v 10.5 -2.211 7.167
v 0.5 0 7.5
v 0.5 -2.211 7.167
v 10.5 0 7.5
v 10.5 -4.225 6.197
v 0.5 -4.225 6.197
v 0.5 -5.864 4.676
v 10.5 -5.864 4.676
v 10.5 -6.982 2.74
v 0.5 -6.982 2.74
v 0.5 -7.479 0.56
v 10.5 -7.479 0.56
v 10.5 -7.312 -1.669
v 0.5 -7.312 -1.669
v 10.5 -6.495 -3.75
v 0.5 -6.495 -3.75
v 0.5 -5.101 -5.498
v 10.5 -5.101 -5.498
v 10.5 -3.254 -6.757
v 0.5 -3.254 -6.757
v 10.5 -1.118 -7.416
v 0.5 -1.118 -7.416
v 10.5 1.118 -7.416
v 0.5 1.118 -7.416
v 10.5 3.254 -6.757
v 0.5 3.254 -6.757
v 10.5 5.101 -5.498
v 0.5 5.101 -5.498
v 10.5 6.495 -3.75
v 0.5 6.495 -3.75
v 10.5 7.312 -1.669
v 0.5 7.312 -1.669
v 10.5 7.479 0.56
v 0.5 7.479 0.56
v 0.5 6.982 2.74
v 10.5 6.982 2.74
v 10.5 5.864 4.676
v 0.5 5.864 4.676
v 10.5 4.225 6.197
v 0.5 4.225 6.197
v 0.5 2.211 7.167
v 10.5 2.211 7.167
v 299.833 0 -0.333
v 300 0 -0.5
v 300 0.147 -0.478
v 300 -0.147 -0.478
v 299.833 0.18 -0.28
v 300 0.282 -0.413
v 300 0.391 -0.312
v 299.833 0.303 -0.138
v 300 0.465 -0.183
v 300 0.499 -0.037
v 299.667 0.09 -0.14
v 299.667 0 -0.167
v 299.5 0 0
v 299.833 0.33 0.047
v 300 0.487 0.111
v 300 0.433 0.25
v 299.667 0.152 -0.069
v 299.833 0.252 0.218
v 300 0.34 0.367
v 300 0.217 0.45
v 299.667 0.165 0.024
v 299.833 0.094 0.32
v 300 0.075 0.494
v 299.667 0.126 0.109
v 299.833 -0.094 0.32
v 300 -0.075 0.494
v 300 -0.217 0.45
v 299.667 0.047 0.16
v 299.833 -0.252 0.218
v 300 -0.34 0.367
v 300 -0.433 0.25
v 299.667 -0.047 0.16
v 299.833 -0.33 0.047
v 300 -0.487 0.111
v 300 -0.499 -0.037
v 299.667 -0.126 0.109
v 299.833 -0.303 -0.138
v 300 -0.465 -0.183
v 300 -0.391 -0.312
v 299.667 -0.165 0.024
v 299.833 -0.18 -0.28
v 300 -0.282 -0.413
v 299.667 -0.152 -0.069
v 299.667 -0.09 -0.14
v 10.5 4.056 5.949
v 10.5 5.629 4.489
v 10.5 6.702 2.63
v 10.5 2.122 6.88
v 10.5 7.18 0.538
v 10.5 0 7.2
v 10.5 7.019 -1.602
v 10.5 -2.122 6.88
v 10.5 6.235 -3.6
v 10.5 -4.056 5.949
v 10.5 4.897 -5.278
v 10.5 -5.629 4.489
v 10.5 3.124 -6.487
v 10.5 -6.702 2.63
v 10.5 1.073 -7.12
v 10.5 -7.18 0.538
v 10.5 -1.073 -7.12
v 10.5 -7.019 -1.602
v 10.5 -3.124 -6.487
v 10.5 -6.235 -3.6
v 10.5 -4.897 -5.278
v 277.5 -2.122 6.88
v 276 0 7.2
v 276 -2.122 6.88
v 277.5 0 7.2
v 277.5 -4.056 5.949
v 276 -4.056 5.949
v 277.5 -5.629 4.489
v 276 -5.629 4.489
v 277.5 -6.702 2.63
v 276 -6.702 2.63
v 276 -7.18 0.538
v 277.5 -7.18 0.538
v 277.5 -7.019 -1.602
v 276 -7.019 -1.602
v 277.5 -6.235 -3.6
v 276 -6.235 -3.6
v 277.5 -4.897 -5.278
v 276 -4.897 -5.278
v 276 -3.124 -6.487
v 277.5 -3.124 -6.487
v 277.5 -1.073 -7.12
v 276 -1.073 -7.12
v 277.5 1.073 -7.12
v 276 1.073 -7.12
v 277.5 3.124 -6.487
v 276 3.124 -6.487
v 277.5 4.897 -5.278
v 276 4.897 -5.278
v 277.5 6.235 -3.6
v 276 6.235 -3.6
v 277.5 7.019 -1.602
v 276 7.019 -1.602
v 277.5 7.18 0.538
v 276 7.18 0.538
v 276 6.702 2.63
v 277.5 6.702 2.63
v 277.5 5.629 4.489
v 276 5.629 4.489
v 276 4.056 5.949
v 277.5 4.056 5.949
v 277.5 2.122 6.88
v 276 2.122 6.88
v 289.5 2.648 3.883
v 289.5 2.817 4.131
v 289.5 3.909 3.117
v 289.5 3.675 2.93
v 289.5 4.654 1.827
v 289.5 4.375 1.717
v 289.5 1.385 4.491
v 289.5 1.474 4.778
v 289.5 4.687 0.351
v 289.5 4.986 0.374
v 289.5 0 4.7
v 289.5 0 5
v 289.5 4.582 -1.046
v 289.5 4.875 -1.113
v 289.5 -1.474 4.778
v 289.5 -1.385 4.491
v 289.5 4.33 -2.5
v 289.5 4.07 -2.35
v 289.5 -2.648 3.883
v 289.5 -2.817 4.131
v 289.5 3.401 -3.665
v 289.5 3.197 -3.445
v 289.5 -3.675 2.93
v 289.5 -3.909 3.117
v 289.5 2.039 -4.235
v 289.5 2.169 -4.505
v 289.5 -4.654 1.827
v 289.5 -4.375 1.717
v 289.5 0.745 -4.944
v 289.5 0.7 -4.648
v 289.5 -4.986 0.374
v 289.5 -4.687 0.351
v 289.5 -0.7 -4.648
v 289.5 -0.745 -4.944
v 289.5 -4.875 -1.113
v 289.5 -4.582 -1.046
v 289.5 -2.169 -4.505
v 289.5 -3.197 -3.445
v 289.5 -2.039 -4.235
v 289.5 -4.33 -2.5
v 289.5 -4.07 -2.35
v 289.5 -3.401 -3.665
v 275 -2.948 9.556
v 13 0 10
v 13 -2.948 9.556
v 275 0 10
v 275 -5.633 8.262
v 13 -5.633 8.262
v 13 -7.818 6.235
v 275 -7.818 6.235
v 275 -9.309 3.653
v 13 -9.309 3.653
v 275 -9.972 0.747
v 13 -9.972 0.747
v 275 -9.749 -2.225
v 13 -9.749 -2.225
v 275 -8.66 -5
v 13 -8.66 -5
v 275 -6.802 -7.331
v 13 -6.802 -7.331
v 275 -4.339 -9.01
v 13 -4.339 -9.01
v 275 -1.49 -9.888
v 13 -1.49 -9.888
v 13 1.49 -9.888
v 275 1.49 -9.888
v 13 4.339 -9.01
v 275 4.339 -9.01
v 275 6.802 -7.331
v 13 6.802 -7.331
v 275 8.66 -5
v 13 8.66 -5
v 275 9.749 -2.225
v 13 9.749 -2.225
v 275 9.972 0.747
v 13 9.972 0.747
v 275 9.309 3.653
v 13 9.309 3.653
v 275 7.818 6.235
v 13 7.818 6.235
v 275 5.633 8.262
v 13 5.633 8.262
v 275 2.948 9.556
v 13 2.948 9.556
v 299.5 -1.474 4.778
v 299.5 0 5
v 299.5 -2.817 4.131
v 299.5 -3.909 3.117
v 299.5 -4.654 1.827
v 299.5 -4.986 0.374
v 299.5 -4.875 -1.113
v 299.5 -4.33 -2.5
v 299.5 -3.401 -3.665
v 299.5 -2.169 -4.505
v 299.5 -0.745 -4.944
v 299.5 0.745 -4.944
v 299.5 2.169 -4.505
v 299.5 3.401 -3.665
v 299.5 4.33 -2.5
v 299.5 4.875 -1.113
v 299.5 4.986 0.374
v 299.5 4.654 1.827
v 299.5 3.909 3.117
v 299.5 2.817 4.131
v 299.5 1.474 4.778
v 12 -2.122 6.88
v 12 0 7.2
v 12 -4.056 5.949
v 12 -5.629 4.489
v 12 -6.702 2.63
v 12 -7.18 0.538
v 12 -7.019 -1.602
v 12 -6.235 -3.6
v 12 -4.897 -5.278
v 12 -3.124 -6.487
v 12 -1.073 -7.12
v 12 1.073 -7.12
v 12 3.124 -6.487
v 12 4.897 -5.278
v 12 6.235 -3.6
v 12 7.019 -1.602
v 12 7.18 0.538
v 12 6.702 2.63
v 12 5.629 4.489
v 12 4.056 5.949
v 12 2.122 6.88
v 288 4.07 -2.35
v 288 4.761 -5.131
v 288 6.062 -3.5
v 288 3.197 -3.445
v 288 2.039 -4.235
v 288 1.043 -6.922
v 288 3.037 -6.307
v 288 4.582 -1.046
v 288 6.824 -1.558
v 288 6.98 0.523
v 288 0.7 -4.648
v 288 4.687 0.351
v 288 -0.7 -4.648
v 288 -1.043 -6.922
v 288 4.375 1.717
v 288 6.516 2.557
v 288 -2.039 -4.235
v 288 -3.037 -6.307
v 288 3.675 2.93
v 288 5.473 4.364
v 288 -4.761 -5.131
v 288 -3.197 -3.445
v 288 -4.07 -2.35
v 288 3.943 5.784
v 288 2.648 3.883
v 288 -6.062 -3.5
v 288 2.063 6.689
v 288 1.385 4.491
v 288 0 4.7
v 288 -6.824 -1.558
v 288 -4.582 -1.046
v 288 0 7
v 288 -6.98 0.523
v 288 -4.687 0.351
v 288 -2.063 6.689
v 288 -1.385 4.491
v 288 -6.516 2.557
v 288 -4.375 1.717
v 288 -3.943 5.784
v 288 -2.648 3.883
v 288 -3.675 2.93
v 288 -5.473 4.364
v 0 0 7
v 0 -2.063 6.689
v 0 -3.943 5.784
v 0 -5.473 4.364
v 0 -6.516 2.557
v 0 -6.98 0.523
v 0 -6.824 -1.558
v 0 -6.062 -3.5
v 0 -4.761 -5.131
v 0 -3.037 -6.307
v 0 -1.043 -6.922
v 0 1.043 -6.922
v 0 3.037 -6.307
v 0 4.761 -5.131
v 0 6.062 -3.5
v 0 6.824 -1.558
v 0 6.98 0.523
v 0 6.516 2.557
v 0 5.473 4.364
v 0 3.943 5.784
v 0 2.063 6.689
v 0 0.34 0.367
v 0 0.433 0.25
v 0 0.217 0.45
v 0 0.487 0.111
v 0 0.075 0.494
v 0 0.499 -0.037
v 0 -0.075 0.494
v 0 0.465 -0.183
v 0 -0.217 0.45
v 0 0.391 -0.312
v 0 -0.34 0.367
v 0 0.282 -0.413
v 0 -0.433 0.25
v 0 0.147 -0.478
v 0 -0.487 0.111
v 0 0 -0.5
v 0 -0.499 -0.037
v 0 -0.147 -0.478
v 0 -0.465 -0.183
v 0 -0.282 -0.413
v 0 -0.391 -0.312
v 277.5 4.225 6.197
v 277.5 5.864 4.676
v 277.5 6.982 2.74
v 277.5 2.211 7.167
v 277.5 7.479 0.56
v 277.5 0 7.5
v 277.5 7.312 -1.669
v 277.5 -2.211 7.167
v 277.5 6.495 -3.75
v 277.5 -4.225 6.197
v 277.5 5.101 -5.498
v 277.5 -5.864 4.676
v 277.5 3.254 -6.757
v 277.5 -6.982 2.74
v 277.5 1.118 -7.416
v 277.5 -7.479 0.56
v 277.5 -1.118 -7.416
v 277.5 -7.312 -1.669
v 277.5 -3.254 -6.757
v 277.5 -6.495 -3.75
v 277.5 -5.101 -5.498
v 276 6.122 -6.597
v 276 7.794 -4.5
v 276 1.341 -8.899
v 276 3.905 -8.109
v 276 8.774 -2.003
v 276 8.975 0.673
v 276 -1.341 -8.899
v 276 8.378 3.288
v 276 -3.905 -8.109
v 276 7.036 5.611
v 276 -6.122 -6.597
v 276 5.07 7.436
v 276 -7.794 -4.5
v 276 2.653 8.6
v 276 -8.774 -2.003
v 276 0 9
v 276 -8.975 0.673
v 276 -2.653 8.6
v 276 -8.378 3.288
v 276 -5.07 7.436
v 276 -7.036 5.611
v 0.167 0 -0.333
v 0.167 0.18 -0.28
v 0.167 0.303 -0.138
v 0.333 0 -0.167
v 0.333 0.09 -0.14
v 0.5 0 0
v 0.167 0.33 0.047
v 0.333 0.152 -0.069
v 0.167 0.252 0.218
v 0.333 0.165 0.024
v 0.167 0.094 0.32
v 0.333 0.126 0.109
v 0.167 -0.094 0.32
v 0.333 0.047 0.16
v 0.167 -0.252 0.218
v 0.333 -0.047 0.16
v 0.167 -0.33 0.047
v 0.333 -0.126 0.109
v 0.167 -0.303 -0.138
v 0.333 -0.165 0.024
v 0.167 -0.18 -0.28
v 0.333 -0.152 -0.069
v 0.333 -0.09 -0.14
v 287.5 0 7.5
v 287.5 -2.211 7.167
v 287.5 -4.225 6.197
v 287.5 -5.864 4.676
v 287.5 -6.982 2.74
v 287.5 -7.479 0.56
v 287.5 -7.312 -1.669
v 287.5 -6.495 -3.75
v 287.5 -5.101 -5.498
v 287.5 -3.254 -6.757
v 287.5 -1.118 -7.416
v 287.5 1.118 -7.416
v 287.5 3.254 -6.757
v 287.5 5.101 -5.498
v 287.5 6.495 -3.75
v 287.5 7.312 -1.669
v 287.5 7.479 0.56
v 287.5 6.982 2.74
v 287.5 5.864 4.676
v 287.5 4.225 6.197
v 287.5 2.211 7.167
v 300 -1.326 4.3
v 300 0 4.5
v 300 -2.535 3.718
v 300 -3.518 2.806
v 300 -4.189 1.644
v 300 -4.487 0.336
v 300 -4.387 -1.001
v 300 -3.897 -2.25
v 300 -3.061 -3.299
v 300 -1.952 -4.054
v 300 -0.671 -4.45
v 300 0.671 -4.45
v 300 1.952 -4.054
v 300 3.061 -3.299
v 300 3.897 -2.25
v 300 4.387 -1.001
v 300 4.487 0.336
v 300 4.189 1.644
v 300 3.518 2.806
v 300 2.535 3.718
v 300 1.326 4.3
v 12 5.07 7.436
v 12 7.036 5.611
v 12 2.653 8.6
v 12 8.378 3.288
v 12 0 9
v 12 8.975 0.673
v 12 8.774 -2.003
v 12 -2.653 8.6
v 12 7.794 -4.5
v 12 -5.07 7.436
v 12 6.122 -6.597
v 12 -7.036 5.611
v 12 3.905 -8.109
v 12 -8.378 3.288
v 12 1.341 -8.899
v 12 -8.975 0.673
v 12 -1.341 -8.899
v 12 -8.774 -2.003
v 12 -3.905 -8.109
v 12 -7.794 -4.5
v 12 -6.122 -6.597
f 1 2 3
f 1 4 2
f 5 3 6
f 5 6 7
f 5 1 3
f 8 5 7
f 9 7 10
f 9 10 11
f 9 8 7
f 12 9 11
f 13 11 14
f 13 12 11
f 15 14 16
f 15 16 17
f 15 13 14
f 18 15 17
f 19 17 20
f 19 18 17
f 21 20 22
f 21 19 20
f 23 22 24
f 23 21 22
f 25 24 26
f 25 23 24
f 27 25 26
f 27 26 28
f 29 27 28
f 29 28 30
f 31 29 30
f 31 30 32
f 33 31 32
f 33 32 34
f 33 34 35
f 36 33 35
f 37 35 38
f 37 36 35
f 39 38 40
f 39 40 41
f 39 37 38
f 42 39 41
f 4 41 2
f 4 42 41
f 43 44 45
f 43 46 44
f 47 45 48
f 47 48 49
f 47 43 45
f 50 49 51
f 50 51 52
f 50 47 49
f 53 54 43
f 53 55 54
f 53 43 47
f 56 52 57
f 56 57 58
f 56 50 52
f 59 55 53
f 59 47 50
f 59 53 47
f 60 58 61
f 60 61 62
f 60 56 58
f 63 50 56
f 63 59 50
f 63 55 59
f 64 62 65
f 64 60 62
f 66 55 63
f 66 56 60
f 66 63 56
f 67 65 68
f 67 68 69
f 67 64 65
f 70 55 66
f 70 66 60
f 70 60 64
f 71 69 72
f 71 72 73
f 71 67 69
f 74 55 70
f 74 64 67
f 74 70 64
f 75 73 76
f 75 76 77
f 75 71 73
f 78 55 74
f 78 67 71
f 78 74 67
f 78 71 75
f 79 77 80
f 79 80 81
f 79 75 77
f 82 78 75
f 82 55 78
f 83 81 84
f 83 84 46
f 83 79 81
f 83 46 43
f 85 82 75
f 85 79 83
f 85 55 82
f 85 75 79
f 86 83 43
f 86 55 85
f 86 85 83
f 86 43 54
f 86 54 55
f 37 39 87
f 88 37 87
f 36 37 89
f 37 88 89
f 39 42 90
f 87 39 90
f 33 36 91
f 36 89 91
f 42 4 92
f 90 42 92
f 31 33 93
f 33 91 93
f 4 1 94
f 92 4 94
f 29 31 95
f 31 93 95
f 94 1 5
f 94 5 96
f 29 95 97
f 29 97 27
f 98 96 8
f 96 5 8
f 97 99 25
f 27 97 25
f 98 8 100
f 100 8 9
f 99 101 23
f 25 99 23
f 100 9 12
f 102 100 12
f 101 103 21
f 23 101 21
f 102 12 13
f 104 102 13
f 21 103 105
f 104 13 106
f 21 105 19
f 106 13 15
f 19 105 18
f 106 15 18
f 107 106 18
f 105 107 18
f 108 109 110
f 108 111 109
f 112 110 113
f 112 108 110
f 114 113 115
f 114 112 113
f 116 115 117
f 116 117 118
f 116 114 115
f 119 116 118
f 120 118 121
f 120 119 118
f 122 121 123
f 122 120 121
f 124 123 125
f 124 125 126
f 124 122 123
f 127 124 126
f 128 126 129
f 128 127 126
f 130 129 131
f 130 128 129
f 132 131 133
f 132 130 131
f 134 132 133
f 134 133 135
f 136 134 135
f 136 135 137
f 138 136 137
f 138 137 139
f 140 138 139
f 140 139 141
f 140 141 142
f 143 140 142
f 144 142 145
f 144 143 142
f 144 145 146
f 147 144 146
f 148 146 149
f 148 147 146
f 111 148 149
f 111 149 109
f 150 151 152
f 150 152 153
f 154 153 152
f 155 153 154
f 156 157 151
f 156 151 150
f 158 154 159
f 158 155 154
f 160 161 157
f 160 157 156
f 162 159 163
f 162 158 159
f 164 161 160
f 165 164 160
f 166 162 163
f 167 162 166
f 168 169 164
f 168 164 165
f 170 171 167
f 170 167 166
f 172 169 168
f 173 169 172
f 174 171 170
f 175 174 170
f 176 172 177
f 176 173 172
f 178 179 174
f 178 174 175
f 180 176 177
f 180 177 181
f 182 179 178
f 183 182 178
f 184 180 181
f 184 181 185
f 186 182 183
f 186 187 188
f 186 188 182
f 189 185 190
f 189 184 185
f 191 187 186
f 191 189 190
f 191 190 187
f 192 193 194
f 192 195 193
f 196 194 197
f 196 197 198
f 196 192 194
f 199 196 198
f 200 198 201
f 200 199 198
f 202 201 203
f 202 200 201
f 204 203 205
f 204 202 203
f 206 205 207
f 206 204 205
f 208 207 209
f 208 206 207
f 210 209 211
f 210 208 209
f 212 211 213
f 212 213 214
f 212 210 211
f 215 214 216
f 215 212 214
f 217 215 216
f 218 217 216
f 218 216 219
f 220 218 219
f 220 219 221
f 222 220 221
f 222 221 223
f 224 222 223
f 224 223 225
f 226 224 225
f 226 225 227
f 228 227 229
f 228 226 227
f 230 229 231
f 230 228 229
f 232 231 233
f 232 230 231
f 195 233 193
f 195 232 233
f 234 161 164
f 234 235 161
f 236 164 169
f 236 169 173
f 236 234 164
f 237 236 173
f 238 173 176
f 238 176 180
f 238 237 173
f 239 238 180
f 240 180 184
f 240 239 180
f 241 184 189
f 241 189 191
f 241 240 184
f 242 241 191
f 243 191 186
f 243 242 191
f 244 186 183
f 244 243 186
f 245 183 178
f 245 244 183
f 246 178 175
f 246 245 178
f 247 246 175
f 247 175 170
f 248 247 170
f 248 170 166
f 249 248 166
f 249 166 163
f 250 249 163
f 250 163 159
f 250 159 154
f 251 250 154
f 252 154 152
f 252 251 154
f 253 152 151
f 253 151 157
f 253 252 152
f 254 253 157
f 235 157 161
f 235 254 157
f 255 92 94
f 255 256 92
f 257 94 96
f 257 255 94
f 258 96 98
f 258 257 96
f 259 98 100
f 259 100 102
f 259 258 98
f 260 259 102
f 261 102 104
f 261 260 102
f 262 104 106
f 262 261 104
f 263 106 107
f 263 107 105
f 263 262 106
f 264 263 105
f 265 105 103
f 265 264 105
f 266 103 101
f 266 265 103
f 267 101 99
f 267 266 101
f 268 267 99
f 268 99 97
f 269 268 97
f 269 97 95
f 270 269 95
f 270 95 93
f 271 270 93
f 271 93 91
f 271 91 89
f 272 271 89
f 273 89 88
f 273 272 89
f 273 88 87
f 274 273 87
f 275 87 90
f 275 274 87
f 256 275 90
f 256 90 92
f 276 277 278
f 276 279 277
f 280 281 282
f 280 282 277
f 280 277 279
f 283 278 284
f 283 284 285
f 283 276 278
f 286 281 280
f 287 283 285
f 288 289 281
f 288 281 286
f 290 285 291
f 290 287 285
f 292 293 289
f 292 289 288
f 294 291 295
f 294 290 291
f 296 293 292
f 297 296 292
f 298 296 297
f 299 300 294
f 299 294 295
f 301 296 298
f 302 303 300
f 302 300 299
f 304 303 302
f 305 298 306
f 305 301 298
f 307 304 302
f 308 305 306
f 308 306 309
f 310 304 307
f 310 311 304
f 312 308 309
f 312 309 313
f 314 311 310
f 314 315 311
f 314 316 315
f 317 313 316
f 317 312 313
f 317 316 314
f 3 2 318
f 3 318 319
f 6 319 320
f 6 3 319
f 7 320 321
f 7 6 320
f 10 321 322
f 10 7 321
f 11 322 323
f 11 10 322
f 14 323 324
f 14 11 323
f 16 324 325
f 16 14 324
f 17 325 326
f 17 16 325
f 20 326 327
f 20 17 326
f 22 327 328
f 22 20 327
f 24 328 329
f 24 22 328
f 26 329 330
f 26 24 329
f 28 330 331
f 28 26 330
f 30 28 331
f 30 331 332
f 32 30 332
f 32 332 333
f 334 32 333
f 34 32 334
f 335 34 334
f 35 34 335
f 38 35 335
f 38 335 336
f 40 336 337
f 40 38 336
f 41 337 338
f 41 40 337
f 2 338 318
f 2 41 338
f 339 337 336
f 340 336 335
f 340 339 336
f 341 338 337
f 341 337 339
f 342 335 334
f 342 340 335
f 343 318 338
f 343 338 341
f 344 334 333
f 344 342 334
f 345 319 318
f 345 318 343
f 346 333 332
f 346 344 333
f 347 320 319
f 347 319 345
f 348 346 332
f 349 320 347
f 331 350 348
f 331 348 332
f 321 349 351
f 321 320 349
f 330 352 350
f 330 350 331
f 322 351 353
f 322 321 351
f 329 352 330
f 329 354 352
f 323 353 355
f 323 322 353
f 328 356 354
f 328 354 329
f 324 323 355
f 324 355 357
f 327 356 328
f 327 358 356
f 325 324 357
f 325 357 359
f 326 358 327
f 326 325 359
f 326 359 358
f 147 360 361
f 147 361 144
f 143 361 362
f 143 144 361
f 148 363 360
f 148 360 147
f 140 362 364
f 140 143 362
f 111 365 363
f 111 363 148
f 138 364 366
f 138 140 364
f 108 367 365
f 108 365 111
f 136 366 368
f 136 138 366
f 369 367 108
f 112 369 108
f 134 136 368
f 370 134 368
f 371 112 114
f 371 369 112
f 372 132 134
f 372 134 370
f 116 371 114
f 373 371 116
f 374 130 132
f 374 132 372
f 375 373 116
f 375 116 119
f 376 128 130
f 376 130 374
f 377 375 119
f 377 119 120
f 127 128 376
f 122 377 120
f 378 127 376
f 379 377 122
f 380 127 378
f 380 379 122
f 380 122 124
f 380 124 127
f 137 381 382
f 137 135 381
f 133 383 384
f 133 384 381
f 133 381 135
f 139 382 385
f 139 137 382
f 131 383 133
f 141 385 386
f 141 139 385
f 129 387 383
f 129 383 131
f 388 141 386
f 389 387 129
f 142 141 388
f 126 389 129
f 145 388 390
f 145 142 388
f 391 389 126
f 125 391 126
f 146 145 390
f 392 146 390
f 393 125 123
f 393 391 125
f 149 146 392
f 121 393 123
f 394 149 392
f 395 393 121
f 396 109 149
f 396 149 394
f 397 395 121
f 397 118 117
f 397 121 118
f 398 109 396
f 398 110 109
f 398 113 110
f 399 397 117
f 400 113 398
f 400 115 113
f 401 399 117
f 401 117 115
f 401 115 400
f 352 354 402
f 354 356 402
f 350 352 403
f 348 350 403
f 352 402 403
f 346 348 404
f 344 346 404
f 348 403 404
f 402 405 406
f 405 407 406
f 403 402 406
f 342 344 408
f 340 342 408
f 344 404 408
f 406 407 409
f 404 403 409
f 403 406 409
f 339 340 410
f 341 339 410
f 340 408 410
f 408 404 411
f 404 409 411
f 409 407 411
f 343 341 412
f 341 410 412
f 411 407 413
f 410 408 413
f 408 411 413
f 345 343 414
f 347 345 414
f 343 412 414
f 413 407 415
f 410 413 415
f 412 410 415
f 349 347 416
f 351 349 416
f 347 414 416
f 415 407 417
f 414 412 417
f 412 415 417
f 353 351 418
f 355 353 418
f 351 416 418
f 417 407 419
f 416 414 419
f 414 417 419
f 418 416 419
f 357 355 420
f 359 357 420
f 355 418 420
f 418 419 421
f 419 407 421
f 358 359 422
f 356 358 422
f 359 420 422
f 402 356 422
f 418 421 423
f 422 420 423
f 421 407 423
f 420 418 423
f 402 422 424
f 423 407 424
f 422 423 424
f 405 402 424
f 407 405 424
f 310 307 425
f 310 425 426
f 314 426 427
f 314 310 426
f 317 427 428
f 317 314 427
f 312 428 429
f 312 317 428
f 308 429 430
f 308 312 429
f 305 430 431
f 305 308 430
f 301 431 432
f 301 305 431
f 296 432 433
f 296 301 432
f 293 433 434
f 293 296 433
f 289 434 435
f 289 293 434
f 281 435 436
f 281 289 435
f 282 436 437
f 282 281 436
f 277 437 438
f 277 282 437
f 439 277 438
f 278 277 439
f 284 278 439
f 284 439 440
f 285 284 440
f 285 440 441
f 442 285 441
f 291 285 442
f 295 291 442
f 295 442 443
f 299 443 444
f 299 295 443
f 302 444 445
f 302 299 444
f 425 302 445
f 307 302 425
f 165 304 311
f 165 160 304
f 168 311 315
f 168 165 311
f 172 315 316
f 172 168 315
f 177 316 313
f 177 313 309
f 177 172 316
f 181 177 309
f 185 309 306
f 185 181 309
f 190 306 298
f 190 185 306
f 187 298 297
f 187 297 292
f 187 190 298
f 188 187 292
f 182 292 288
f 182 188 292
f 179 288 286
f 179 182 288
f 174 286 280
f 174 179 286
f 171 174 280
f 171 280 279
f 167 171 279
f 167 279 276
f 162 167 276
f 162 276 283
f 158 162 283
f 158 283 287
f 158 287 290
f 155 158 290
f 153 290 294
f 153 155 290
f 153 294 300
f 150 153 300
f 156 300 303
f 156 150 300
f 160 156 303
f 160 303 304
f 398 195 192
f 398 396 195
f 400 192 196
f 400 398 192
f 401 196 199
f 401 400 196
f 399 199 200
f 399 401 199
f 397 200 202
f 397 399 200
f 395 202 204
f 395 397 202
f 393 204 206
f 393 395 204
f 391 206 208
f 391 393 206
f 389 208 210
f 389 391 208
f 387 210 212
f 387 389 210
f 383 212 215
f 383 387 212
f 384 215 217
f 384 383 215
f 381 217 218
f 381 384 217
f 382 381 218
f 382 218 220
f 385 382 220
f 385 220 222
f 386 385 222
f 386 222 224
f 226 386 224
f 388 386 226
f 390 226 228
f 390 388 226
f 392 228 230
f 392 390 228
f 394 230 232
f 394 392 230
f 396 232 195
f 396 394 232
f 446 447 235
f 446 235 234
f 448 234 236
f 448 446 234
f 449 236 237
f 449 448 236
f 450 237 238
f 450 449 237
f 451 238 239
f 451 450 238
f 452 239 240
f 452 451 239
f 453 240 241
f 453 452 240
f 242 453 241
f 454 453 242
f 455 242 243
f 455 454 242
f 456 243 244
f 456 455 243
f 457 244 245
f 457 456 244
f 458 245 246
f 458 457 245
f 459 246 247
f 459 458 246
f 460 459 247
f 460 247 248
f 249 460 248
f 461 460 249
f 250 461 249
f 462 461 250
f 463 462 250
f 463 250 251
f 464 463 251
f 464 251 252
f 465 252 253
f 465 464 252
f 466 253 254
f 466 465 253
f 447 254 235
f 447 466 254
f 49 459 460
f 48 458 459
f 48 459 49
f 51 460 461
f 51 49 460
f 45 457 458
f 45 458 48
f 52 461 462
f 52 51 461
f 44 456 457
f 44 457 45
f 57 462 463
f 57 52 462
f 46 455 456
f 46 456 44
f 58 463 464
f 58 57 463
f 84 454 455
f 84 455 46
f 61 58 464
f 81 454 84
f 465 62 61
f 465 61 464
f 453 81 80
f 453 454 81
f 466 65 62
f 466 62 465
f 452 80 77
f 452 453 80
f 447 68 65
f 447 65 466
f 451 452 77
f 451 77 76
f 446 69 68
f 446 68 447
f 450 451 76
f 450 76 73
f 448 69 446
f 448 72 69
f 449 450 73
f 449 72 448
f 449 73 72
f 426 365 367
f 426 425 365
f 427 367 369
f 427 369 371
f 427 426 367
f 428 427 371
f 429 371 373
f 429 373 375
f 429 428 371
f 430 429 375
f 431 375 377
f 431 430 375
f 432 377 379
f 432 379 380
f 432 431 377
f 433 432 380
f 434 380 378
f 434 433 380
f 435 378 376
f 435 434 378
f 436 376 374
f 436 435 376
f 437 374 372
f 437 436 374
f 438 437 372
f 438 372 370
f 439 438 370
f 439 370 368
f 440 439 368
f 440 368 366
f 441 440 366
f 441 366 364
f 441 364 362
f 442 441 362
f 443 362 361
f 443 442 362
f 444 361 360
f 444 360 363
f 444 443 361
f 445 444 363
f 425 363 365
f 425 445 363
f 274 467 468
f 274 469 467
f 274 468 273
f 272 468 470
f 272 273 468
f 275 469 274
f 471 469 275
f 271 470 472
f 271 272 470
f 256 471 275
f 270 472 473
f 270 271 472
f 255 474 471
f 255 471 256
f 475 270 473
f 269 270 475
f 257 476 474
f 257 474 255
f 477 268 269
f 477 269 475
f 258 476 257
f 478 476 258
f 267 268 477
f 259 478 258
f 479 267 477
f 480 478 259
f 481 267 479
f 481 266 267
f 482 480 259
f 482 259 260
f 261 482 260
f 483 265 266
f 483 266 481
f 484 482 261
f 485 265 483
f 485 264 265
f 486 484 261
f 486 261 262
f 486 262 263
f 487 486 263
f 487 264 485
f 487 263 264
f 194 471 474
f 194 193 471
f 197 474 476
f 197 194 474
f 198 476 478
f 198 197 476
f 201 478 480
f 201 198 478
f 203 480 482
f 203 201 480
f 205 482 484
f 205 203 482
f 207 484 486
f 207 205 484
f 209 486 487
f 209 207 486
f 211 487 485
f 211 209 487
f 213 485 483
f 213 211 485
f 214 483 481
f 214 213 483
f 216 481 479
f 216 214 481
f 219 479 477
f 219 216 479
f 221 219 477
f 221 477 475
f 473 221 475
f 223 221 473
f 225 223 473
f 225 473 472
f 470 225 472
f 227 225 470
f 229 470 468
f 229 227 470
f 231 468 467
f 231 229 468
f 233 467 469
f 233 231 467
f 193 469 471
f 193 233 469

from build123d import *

# Parameters (mm, degrees)
CHAMFER1_SIZE = 0.5
SKETCH3_W     = 1.5
SKETCH3_H     = 0.3


with BuildPart() as part:
    # Sketch1 → Revolve1 (revolve)
    with BuildSketch(Plane.XY):
        Polygon((0, 0), (0, 7.5), (12, 7.5), (12, 9), (13, 10), (275, 10), (276, 9), (276, 7.5), (288, 7.5), (288, 5), (300, 5), (300, 0), align=None)
    revolve(axis=Axis((0, 0, 0), (1, 0, 0)))

    # Chamfer1
    chamfer1_edges = [part.edges().sort_by_distance(p)[0] for p in [
        (300, -5, 0),
        (288, -7.5, 0),
        (0, -7.5, 0),
    ]]
    chamfer(chamfer1_edges, length=CHAMFER1_SIZE)

    # Sketch2 → Cut-Revolve1 (revolve, cut)
    with BuildSketch(Plane.XY):
        Polygon((0, 0), (0, 0.5), (0.5, 0), align=None)
        Polygon((300, 0), (300, 0.5), (299.5, 0), align=None)
    revolve(axis=Axis((0, 0, 0), (1, 0, 0)), mode=Mode.SUBTRACT)

    # Sketch3 → Cut-Revolve2 (revolve, cut)
    with BuildSketch(Plane.XY):
        with Locations((11.25, 7.35)):
            Rectangle(SKETCH3_W, SKETCH3_H)
        with Locations((276.75, 7.35)):
            Rectangle(SKETCH3_W, SKETCH3_H)
        with Locations((288.75, 4.85)):
            Rectangle(SKETCH3_W, SKETCH3_H)
    revolve(axis=Axis((0, 0, 0), (1, 0, 0)), mode=Mode.SUBTRACT)


solid = part.part
